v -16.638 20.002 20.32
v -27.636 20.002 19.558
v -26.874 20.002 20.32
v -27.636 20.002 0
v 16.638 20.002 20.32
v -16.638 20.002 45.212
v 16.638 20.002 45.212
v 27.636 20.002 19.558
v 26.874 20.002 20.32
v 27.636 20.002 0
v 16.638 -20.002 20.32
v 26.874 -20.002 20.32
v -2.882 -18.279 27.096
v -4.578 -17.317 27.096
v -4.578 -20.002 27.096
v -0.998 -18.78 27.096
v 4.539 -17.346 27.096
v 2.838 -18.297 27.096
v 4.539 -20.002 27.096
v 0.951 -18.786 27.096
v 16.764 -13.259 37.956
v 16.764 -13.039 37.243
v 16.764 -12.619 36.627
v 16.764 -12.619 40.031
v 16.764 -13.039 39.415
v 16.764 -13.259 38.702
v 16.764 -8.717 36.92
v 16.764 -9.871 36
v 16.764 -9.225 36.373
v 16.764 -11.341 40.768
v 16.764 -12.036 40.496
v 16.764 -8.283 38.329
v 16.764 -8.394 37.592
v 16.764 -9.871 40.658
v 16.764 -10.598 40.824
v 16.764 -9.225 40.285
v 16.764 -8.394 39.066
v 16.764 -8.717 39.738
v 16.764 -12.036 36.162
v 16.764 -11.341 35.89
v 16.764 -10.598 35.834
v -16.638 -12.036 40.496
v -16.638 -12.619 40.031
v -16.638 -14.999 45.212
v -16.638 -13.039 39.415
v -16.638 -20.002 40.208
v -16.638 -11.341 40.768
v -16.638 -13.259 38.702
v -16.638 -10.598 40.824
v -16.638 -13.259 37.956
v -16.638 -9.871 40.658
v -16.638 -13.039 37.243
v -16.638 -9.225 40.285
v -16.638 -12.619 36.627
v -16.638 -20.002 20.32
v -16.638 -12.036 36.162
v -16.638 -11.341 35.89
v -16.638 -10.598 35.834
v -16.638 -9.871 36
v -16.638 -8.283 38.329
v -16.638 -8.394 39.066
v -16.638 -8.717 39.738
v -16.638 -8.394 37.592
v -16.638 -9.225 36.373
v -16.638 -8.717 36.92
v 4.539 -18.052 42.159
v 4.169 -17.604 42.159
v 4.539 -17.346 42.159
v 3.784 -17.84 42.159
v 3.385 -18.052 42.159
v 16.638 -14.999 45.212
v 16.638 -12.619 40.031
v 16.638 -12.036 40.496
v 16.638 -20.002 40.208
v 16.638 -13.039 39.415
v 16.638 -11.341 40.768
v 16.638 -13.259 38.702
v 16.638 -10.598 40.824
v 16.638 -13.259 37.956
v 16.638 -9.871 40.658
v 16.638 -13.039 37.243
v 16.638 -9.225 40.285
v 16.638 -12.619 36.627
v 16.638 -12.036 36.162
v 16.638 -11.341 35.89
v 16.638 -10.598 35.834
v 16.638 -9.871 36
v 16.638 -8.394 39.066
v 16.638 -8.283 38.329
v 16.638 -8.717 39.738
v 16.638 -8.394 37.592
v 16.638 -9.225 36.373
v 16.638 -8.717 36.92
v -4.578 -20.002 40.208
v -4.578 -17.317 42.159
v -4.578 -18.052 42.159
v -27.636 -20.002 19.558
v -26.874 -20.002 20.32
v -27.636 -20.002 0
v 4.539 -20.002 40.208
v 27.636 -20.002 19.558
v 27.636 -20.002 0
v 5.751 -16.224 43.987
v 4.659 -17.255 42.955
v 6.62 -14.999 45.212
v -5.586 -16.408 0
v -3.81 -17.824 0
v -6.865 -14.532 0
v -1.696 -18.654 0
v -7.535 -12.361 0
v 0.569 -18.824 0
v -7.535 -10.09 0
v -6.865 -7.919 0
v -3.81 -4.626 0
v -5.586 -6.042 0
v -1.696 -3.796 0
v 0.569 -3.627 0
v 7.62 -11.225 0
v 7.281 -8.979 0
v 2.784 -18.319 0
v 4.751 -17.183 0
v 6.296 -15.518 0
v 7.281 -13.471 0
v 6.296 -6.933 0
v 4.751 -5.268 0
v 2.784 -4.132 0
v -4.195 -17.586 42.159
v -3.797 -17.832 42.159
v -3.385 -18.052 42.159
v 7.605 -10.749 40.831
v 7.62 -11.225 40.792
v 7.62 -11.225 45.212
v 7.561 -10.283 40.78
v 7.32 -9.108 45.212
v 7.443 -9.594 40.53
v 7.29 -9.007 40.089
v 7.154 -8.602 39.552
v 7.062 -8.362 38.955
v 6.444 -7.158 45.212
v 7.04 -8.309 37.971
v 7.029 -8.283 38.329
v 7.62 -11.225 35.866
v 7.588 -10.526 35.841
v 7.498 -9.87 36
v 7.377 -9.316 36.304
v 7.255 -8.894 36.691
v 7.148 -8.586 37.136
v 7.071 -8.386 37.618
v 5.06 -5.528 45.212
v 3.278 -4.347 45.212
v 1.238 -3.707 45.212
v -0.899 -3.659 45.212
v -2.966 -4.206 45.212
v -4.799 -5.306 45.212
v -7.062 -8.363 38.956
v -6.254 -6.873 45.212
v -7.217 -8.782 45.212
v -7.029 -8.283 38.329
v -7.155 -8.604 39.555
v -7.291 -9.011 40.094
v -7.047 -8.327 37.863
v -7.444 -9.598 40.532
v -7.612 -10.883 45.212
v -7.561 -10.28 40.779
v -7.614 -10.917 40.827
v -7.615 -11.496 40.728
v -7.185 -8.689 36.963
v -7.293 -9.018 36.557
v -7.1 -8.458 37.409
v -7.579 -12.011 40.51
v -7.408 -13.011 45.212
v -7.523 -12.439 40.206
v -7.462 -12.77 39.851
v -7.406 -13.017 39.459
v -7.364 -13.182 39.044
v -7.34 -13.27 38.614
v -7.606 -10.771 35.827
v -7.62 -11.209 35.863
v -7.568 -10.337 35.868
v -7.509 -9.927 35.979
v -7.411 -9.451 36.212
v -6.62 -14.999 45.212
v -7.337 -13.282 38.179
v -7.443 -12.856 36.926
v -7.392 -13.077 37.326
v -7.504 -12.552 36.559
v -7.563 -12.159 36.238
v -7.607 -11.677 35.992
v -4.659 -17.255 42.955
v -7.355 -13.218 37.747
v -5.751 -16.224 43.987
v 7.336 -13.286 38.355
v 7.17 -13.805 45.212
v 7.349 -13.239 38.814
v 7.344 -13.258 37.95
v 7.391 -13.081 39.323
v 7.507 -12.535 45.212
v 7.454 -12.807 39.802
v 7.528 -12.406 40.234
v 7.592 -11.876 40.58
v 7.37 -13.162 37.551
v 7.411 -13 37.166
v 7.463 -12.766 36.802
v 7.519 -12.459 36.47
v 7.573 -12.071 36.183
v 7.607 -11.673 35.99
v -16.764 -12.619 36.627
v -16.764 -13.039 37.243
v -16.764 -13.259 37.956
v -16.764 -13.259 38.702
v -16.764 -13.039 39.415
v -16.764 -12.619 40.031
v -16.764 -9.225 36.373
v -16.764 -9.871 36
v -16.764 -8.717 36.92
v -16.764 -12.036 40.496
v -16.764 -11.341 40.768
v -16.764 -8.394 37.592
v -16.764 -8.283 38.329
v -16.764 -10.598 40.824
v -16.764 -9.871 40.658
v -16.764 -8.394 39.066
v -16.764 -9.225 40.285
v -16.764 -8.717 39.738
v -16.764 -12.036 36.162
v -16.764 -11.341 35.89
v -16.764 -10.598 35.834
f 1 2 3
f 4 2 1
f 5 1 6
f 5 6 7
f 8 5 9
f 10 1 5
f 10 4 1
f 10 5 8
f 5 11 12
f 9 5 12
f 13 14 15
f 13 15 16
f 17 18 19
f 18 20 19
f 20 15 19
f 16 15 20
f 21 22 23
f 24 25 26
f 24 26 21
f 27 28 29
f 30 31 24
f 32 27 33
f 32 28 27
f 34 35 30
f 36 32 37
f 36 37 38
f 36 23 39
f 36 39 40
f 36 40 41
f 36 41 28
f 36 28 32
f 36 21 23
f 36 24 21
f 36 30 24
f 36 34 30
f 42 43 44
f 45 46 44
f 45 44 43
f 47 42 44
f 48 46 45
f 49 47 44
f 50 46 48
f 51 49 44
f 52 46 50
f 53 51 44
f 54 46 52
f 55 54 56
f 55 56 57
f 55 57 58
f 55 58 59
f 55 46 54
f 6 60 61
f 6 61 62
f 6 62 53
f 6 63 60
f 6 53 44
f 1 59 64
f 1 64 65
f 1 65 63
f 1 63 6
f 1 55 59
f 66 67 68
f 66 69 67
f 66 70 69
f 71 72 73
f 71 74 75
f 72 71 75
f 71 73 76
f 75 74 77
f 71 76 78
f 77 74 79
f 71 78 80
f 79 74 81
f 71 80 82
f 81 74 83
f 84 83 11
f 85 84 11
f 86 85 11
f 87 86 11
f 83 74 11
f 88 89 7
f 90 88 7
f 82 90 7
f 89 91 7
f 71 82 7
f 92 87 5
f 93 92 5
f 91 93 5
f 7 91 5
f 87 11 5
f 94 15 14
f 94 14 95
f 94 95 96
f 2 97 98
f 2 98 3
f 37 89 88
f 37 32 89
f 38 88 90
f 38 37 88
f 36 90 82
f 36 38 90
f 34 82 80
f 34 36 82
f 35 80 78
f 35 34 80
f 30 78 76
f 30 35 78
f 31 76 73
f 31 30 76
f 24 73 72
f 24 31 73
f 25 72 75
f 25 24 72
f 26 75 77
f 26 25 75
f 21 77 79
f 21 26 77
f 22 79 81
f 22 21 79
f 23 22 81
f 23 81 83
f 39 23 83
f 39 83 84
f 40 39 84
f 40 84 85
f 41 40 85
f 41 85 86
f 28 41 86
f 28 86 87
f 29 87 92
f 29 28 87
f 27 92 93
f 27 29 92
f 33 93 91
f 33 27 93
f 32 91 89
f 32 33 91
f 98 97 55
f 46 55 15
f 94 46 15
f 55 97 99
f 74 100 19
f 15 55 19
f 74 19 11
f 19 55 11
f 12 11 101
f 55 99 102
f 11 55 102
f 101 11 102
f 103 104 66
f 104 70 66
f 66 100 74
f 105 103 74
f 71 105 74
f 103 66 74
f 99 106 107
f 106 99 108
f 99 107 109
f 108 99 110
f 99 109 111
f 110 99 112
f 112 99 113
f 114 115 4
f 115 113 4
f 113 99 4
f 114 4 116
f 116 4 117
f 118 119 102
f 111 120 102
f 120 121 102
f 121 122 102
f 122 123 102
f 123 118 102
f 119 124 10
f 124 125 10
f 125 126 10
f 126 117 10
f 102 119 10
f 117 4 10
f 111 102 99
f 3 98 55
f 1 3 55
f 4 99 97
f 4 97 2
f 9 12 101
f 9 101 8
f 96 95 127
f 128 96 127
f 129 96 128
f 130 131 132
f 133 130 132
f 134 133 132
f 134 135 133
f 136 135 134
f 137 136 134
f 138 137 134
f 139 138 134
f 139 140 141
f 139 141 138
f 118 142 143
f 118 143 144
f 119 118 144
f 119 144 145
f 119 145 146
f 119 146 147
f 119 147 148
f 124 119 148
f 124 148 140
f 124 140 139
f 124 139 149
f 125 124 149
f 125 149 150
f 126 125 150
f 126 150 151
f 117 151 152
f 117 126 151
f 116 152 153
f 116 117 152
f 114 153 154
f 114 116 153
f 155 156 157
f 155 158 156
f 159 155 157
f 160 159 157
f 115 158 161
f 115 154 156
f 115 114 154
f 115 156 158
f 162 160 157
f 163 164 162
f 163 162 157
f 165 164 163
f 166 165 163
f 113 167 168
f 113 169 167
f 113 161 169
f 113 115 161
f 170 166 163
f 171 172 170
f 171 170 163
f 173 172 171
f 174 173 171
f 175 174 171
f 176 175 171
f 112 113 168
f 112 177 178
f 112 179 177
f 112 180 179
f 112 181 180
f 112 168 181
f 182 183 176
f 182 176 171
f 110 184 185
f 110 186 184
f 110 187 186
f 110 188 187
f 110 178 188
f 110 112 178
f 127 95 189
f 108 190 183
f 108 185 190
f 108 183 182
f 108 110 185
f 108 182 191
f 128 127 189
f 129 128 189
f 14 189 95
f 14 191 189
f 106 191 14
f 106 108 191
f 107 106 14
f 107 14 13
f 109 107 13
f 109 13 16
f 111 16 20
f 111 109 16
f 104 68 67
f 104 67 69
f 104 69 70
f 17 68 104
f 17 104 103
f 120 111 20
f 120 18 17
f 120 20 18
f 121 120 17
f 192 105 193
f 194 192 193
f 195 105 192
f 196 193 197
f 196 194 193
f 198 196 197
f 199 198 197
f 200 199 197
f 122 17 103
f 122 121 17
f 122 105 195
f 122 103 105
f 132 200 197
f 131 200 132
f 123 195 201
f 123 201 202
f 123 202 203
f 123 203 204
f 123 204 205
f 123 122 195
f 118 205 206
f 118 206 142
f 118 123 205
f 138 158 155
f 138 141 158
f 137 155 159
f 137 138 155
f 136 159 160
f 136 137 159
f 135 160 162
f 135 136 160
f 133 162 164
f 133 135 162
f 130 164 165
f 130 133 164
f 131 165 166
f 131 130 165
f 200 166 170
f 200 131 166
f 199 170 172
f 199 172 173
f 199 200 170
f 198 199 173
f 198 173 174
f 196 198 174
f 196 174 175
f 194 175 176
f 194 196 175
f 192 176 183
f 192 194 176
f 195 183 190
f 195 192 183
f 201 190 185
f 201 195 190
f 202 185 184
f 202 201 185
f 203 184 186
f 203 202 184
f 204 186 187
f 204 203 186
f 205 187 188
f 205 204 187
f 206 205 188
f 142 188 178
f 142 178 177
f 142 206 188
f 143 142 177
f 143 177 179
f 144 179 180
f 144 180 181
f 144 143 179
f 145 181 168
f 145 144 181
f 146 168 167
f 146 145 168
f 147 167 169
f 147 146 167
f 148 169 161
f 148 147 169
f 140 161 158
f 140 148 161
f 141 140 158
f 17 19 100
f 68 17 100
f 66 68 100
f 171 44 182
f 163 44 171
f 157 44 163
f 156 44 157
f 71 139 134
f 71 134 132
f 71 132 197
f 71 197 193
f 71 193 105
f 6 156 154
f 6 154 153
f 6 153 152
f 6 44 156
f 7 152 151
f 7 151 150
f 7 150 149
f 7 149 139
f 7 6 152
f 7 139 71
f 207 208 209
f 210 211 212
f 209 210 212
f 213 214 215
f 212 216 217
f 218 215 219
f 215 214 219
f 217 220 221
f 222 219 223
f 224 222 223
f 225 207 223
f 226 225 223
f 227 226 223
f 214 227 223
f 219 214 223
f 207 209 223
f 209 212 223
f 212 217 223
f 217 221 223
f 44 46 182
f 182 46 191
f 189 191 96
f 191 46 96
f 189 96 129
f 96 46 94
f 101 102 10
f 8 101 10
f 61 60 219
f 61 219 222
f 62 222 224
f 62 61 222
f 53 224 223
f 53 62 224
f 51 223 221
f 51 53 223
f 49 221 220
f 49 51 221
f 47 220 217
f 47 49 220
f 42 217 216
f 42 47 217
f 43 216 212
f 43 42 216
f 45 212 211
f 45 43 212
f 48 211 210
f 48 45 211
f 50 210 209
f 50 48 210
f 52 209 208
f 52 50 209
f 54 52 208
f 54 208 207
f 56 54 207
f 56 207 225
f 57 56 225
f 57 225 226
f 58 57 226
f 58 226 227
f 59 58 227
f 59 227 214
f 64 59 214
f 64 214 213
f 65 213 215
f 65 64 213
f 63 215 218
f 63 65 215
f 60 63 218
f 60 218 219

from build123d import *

# Parameters (mm, degrees)
F0_W      = 33.27621
F0_H      = 40.005
F1_DEPTH  = 45.212
F0_W_2    = 10.9982
F2_DEPTH  = 20.32
F3_SIZE   = 5.0038
F4_R      = 7.62
F5_DEPTH  = 62.738
F6_R      = 2.5019
F7_DEPTH  = 16.764
F8_SIZE   = 0.762
F9_SIZE   = 0.762
F10_W     = 9.116596
F10_H     = 15.0622
F11_DEPTH = 3.048


with BuildPart() as f1:
    # F0 (on Top) → F1 (new body)
    with BuildSketch(Plane.XY):
        Rectangle(F0_W, F0_H)
    extrude(amount=F1_DEPTH)

    # F0 (on Top) → F2 (join)
    with BuildSketch(Plane.XY):
        with Locations((-22.137205, 0)):
            Rectangle(F0_W_2, F0_H)
        with Locations((22.137205, 0)):
            Rectangle(F0_W_2, F0_H)
    extrude(amount=F2_DEPTH)

    # F3
    f3_edges = [f1.edges().sort_by_distance(p)[0] for p in [
        (0, -20.0025, 45.212),
    ]]
    chamfer(f3_edges, length=F3_SIZE)

    # F4 (on Top) → F5 (cut)
    with BuildSketch(Plane.XY):
        with Locations((0, -11.22532)):
            Circle(F4_R)
    extrude(amount=F5_DEPTH, mode=Mode.SUBTRACT)

    # F6 (on Right) → F7 (join, symmetric)
    with BuildSketch(Plane.YZ):
        with Locations((-10.78459, 38.329016)):
            Circle(F6_R)
    extrude(amount=F7_DEPTH, both=True)

    # F8
    f8_edges = [f1.edges().sort_by_distance(p)[0] for p in [
        (-27.636305, 0, 20.32),
    ]]
    chamfer(f8_edges, length=F8_SIZE)

    # F9
    f9_edges = [f1.edges().sort_by_distance(p)[0] for p in [
        (27.636305, 0, 20.32),
    ]]
    chamfer(f9_edges, length=F9_SIZE)

    # F10 (on face) → F11 (cut)
    with BuildSketch(Plane.XZ.offset(20.0025)):
        with Locations((-0.019252, 34.627516)):
            Rectangle(F10_W, F10_H)
    extrude(amount=-F11_DEPTH, mode=Mode.SUBTRACT)


solid = f1.part
